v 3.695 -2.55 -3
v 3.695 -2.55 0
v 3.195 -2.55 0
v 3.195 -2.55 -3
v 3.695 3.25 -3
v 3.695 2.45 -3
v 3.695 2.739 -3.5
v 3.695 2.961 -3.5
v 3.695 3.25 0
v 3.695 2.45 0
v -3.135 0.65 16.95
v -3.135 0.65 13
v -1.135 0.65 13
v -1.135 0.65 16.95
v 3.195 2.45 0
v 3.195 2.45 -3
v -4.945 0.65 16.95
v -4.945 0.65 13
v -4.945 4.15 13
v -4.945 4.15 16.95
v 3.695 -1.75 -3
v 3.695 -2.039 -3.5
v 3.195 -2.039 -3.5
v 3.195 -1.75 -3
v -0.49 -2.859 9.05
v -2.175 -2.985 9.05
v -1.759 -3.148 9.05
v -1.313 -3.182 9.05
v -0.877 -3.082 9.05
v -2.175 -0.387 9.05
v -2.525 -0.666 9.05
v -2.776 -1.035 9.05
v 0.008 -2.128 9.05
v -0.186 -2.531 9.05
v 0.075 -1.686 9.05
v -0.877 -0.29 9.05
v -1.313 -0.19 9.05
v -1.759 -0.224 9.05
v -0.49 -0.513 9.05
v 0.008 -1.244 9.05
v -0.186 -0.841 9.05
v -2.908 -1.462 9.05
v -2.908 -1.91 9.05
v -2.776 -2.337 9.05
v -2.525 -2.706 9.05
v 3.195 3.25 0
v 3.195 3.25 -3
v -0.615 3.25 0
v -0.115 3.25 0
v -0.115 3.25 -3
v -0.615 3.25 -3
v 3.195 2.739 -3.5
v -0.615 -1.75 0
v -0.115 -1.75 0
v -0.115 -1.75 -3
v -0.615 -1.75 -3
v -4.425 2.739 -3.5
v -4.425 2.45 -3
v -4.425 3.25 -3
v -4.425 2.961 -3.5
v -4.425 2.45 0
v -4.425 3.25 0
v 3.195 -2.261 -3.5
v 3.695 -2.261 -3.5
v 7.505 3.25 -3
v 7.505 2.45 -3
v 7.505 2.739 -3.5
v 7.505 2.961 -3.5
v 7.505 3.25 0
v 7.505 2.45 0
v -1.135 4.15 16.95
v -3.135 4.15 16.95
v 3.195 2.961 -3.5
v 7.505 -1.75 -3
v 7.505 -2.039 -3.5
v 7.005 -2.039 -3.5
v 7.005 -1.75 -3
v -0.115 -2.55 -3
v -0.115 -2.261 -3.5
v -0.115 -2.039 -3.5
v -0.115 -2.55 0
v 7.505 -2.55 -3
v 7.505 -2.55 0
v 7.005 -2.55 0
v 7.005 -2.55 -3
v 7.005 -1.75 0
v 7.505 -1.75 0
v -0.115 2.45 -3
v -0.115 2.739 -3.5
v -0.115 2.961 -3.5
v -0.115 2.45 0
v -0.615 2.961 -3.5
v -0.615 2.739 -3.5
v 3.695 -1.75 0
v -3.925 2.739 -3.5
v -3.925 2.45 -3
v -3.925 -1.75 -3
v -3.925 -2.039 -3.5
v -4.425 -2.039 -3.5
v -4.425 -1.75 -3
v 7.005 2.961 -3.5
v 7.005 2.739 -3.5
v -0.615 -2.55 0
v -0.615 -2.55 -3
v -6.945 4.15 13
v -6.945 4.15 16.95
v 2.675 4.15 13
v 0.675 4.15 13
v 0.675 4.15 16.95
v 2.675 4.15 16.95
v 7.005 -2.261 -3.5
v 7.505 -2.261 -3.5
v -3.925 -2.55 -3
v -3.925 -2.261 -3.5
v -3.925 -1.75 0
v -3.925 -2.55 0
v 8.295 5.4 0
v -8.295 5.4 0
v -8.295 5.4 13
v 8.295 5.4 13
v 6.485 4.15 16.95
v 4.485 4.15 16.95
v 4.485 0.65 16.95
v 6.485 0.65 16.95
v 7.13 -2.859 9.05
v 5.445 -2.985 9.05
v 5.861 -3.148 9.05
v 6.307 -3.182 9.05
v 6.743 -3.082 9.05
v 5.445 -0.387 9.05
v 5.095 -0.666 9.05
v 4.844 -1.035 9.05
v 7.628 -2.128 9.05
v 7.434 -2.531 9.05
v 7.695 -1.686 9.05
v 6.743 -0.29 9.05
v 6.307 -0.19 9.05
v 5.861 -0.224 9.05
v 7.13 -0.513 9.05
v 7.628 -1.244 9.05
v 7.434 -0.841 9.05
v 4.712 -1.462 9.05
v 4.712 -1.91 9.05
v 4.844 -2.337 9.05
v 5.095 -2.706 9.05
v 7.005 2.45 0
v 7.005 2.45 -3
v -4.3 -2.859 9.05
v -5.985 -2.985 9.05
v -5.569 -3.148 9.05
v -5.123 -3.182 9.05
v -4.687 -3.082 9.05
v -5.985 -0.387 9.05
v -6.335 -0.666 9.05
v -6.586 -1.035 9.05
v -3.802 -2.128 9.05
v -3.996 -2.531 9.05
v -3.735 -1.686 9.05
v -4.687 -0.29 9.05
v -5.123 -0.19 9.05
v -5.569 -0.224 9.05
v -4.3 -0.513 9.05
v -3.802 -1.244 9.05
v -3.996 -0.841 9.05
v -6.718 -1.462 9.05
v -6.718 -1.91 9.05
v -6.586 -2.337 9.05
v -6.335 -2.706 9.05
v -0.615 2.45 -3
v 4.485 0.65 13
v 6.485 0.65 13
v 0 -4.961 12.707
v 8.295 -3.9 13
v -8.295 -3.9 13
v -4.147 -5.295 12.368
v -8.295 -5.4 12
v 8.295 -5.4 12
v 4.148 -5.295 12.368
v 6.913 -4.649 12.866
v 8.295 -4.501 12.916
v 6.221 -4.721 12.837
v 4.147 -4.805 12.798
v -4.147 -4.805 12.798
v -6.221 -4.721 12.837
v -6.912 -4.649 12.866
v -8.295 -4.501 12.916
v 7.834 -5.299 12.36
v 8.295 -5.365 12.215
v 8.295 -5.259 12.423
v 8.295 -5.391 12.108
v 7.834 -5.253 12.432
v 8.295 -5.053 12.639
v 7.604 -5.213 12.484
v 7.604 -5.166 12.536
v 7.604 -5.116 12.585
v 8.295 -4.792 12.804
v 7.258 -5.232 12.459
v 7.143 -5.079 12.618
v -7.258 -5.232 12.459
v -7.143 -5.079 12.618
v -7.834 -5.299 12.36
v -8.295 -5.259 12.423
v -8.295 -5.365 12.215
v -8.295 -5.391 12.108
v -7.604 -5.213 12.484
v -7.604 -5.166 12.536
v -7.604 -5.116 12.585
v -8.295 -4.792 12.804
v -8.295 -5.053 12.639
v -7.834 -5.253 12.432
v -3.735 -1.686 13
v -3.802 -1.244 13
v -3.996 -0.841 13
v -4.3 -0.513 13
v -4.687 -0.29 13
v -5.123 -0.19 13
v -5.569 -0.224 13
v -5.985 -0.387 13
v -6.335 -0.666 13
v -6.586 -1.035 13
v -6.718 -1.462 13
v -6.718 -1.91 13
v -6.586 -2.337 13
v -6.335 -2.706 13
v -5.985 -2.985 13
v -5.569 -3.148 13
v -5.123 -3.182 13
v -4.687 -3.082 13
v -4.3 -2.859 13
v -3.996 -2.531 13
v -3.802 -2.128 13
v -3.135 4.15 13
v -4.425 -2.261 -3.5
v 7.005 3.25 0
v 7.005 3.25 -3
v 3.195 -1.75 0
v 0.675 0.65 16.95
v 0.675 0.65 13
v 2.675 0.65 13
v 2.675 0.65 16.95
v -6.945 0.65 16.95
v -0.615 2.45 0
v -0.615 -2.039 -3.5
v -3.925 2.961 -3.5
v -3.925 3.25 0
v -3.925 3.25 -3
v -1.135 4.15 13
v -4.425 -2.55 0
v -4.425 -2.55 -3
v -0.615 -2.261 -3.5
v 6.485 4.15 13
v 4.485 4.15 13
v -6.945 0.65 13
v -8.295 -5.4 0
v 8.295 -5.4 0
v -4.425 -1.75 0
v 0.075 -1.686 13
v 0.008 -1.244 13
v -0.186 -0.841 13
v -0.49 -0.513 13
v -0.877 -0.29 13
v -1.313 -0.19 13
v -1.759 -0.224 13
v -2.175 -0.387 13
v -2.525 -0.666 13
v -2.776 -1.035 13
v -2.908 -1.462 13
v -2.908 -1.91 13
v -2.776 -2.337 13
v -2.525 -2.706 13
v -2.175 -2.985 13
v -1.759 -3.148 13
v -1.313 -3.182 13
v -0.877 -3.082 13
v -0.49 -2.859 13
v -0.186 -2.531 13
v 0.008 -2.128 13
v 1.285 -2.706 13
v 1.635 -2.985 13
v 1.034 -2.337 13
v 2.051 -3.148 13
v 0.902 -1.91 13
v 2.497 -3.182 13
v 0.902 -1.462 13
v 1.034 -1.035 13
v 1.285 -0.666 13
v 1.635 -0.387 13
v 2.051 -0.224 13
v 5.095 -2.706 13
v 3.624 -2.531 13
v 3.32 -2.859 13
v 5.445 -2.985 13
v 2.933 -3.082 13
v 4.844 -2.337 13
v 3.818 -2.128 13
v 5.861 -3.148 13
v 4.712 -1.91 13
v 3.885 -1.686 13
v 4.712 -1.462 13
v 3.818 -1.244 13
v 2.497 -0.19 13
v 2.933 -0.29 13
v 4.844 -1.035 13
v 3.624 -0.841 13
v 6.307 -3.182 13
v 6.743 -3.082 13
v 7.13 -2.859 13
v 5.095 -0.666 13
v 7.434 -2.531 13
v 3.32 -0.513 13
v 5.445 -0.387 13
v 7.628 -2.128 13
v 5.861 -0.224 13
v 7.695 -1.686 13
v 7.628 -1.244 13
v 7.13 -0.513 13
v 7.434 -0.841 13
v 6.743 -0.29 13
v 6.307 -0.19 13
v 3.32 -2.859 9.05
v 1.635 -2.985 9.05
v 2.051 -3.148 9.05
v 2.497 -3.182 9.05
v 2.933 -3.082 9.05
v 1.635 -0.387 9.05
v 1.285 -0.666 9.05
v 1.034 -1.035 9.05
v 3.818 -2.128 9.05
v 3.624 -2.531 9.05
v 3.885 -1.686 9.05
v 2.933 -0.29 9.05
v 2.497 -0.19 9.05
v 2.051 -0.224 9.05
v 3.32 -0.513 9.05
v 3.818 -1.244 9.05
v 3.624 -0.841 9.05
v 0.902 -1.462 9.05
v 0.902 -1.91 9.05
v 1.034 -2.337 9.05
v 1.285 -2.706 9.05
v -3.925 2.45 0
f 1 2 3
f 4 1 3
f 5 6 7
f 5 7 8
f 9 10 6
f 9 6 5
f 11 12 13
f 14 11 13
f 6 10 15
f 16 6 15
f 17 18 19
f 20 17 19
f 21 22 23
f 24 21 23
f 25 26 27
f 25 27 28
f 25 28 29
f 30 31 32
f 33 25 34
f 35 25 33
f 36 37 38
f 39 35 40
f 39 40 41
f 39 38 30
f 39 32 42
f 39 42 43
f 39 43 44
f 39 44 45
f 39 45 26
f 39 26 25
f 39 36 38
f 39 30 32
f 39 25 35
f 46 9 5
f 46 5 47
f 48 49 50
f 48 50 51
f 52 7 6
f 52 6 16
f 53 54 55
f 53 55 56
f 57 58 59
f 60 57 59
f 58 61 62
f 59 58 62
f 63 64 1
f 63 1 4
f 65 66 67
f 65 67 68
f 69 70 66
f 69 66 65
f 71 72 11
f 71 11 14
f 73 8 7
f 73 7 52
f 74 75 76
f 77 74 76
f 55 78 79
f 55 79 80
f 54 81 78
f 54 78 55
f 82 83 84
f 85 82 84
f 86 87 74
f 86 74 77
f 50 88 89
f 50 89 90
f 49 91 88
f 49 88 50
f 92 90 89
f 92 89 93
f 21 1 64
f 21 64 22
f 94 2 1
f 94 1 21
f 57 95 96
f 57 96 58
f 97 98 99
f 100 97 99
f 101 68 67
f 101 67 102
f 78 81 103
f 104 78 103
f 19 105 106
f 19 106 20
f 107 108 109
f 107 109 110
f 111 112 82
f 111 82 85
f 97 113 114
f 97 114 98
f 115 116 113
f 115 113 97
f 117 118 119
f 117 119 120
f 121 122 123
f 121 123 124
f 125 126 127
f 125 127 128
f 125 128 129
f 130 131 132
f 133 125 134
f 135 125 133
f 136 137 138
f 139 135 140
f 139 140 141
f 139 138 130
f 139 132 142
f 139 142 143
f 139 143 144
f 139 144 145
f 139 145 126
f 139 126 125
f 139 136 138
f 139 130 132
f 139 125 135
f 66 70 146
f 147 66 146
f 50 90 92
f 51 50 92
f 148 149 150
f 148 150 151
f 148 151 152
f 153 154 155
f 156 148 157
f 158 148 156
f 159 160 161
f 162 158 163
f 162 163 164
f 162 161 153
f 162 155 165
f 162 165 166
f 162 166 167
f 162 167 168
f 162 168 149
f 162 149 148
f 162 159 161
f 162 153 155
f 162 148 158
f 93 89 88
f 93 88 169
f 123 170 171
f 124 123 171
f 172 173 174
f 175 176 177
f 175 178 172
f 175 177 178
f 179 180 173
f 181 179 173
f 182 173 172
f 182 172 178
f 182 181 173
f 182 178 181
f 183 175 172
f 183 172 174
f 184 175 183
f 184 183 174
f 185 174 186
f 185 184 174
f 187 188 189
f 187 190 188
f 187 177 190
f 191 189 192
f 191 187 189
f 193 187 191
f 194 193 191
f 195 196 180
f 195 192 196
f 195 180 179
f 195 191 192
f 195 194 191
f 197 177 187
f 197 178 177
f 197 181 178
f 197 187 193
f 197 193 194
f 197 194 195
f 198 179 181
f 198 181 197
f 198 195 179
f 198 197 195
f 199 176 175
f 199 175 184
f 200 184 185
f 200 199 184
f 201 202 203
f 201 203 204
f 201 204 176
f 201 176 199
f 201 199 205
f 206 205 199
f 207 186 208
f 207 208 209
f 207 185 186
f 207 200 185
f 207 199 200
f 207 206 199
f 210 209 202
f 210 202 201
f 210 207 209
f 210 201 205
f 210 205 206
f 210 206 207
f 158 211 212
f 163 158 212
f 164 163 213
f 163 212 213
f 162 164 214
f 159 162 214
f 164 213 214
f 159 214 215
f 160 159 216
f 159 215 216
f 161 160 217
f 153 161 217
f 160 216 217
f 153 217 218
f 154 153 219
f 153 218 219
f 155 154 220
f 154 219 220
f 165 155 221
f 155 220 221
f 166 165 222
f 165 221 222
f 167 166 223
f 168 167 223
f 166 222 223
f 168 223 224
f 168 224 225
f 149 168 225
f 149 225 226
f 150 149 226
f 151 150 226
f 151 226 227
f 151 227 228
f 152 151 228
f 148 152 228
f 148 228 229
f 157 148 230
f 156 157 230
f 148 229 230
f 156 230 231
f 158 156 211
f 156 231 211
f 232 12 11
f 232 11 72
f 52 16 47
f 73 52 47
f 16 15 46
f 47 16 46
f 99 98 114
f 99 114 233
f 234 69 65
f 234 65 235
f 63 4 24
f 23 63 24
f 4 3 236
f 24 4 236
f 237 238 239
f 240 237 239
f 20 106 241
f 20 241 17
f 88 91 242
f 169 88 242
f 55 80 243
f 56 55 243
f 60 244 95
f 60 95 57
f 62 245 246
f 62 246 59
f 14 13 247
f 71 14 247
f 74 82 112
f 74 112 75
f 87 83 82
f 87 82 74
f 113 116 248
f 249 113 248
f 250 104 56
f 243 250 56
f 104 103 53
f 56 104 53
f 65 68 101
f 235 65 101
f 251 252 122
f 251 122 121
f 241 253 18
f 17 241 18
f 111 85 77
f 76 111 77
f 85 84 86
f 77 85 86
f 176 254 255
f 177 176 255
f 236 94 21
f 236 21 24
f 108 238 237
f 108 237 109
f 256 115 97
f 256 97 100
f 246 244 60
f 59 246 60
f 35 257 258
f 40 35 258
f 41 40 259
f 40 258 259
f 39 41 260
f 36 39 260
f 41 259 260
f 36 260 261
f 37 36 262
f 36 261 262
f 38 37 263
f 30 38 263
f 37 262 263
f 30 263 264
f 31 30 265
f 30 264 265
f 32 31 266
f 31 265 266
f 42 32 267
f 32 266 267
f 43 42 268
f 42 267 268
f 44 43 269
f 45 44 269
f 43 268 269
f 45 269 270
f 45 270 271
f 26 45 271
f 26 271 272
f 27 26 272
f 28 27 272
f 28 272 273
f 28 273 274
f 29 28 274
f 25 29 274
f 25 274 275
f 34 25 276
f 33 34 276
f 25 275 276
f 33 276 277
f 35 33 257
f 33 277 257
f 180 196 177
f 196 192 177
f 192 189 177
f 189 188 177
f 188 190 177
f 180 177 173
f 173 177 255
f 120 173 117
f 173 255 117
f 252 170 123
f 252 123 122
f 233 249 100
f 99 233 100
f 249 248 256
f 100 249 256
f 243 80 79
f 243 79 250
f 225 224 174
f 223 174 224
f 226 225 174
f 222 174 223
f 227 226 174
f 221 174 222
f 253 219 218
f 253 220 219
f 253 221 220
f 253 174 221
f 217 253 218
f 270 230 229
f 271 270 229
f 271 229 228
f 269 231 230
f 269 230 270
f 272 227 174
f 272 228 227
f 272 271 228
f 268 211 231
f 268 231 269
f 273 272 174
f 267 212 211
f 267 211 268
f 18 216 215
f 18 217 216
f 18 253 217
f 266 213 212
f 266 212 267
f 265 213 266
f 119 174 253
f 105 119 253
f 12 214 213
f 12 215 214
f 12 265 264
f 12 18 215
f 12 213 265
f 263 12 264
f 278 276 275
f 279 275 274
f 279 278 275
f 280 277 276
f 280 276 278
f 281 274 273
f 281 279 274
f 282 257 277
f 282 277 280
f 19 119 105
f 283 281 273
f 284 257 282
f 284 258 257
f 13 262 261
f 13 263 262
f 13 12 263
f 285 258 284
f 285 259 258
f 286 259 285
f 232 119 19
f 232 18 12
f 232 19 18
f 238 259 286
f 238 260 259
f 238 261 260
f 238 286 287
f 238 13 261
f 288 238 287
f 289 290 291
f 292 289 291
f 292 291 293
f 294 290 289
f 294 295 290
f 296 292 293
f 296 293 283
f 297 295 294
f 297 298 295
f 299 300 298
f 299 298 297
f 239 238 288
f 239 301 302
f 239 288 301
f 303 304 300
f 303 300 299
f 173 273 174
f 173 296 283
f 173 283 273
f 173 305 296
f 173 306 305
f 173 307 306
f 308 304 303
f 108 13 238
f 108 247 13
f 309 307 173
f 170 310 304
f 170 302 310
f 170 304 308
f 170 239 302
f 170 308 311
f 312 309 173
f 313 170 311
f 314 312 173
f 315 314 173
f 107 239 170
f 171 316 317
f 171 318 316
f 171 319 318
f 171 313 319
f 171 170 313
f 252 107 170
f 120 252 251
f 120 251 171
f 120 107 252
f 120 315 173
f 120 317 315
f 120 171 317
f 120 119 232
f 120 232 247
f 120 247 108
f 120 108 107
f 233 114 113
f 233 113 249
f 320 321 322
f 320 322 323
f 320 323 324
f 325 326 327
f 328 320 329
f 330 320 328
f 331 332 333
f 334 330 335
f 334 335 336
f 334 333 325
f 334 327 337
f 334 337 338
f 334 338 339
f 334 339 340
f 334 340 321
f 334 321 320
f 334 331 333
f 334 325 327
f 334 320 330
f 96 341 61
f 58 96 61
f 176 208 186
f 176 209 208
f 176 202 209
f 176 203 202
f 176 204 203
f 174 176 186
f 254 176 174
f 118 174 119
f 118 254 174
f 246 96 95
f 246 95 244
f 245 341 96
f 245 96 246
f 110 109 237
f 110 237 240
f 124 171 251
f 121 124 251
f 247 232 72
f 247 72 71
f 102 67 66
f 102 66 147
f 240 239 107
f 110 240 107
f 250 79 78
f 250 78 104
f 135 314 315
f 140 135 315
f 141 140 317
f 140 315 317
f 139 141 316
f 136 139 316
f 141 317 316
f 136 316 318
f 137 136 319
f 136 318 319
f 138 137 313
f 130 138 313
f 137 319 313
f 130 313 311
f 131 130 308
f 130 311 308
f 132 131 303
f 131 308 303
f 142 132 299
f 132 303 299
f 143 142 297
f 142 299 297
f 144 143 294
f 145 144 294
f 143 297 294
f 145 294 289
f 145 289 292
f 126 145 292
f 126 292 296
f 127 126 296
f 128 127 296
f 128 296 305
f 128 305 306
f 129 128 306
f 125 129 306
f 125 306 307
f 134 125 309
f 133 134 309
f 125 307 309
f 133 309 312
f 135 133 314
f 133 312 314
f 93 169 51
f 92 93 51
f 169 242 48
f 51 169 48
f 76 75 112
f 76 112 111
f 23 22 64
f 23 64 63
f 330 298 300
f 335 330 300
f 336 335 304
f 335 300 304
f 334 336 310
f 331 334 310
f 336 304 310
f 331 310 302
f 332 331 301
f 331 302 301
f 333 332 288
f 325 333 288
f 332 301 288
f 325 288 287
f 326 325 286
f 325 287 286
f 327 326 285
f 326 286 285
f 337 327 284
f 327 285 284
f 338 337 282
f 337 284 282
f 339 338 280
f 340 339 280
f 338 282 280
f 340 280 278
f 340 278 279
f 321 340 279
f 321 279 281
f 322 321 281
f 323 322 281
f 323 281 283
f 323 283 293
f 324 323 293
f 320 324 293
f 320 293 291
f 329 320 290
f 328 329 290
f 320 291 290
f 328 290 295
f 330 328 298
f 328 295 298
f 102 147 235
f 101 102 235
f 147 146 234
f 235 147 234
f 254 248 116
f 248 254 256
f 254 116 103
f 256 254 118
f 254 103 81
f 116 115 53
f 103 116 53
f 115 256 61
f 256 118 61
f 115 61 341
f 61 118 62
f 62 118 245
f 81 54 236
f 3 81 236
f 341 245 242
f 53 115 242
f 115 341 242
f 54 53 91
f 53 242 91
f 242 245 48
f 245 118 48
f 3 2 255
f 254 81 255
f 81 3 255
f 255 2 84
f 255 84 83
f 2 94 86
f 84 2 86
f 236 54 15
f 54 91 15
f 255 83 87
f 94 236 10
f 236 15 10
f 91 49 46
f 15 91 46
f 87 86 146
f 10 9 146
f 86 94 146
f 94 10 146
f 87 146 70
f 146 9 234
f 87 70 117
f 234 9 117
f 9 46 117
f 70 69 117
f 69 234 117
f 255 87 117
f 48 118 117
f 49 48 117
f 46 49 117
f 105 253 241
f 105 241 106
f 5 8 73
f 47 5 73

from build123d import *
from OCP.BRepFilletAPI import BRepFilletAPI_MakeChamfer

# Parameters (mm, degrees)
SKETCH_1_W                          = 16.59
SKETCH_1_H                          = 10.8
EXTRUDE_1_DEPTH                     = 13
FILLET_1_SIZE                       = 1
FILLET_1_SIZE_2                     = 1.5
SKETCH_2_W                          = 2
SKETCH_2_H                          = 3.5
EXTRUDE_2_DEPTH                     = 3.95
SKETCH_3_R                          = 1.5
CUT_EXTRUDE_1_DEPTH                 = 3.95
SKETCH_4_W                          = 0.5
SKETCH_4_H                          = 0.8
EXTRUDE_3_DEPTH                     = 3.5
CHAMFER_1_SIZE                      = 0.5
CHAMFER_1_SIZE2                     = 0.288675135
PATTERN_LINEAR_2_COUNT              = 4
PATTERN_LINEAR_2_PITCH              = 3.81
CHAMFER_1_OF_PATTERN_LINEAR_2_SIZE  = 0.5
CHAMFER_1_OF_PATTERN_LINEAR_2_SIZE2 = 0.288675135


with BuildPart() as part:
    # Эскиз1 → Бобышка-Вытянуть1 (new body)
    with BuildSketch(Plane.XY):
        Rectangle(SKETCH_1_W, SKETCH_1_H)
    extrude(amount=EXTRUDE_1_DEPTH)

    # Скругление1
    # an asymmetric fillet: 1.5, 1 mm, written as the material it takes off along each edge
    with BuildSketch(Plane(origin=(-12.045, -5.4, 13), x_dir=(0, 0, -1), z_dir=(1, 0, 0))) as fillet_1_piece_1:
        with BuildLine():
            Bezier((FILLET_1_SIZE, 0), (0, 0), (0, FILLET_1_SIZE_2), weights=[1, 0.707106781, 1])
            Line((0, FILLET_1_SIZE_2), (0, 0))
            Line((0, 0), (FILLET_1_SIZE, 0))
        make_face()
    extrude(amount=24.09, mode=Mode.SUBTRACT)

    # Эскиз2 → Бобышка-Вытянуть2 (add)
    with BuildSketch(Plane.XY.offset(13)):
        with Locations((5.485, 2.4)):
            Rectangle(SKETCH_2_W, SKETCH_2_H)
    extrude_2 = extrude(amount=EXTRUDE_2_DEPTH)

    # Эскиз3 → Вырез-Вытянуть1 (cut)
    with BuildSketch(Plane.XY.offset(13)):
        with Locations((6.195, -1.686021073)):
            Circle(SKETCH_3_R)
    cut_extrude_1 = extrude(amount=-CUT_EXTRUDE_1_DEPTH, mode=Mode.SUBTRACT)

    # Эскиз4 → Бобышка-Вытянуть3 (add)
    with BuildSketch(Plane(origin=(0, 0, 0), x_dir=(-1, 0, 0), z_dir=(0, 0, -1))):
        with Locations((-7.255, 2.85)):
            Rectangle(SKETCH_4_W, SKETCH_4_H)
        with Locations((-7.255, -2.15)):
            Rectangle(SKETCH_4_W, SKETCH_4_H)
    extrude_3 = extrude(amount=EXTRUDE_3_DEPTH)

    # Фаска1: one chamfer whose edges measure the first distance from different faces: ONE call of the kernel's chamfer builder (chamfer() names one face for all edges)
    chamfer_1_edges_1 = [part.edges().sort_by_distance(p)[0] for p in [
        (7.255, 3.25, -3.5),
    ]]
    chamfer_1_side_1 = [part.faces().sort_by_distance(p)[0] for p in [
        (7.255, 3.25, -1.75),
    ]]
    chamfer_1_edges_2 = [part.edges().sort_by_distance(p)[0] for p in [
        (7.255, 2.45, -3.5),
    ]]
    chamfer_1_side_2 = [part.faces().sort_by_distance(p)[0] for p in [
        (7.255, 2.45, -1.75),
    ]]
    chamfer_1_edges_3 = [part.edges().sort_by_distance(p)[0] for p in [
        (7.255, -2.55, -3.5),
    ]]
    chamfer_1_side_3 = [part.faces().sort_by_distance(p)[0] for p in [
        (7.255, -2.55, -1.75),
    ]]
    chamfer_1_edges_4 = [part.edges().sort_by_distance(p)[0] for p in [
        (7.255, -1.75, -3.5),
    ]]
    chamfer_1_side_4 = [part.faces().sort_by_distance(p)[0] for p in [
        (7.255, -1.75, -1.75),
    ]]
    chamfer_1 = BRepFilletAPI_MakeChamfer(part.part.solid().wrapped)
    for e in chamfer_1_edges_1:
        chamfer_1.Add(CHAMFER_1_SIZE, CHAMFER_1_SIZE2, e.wrapped, chamfer_1_side_1[0].wrapped)  # the first distance lies on this face
    for e in chamfer_1_edges_2:
        chamfer_1.Add(CHAMFER_1_SIZE, CHAMFER_1_SIZE2, e.wrapped, chamfer_1_side_2[0].wrapped)  # the first distance lies on this face
    for e in chamfer_1_edges_3:
        chamfer_1.Add(CHAMFER_1_SIZE, CHAMFER_1_SIZE2, e.wrapped, chamfer_1_side_3[0].wrapped)  # the first distance lies on this face
    for e in chamfer_1_edges_4:
        chamfer_1.Add(CHAMFER_1_SIZE, CHAMFER_1_SIZE2, e.wrapped, chamfer_1_side_4[0].wrapped)  # the first distance lies on this face
    add(Compound.cast(chamfer_1.Shape()), mode=Mode.REPLACE)

    # Линейный массив2: Бобышка-Вытянуть2, Вырез-Вытянуть1, Бобышка-Вытянуть3 ×4
    with Locations(*[(-i * PATTERN_LINEAR_2_PITCH, 0, 0) for i in range(1, PATTERN_LINEAR_2_COUNT)]):
        add(extrude_2)
        add(cut_extrude_1, mode=Mode.SUBTRACT)
        add(extrude_3)

    # Фаска1 of Линейный массив2: one chamfer whose edges measure the first distance from different faces: ONE call of the kernel's chamfer builder (chamfer() names one face for all edges)
    chamfer_1_of_pattern_linear_2_edges_1 = [part.edges().sort_by_distance(p)[0] for p in [
        (3.445, 3.25, -3.5),
    ]]
    chamfer_1_of_pattern_linear_2_side_1 = [part.faces().sort_by_distance(p)[0] for p in [
        (3.445, 3.25, -1.75),
    ]]
    chamfer_1_of_pattern_linear_2_edges_2 = [part.edges().sort_by_distance(p)[0] for p in [
        (3.445, 2.45, -3.5),
    ]]
    chamfer_1_of_pattern_linear_2_side_2 = [part.faces().sort_by_distance(p)[0] for p in [
        (3.445, 2.45, -1.75),
    ]]
    chamfer_1_of_pattern_linear_2_edges_3 = [part.edges().sort_by_distance(p)[0] for p in [
        (3.445, -2.55, -3.5),
    ]]
    chamfer_1_of_pattern_linear_2_side_3 = [part.faces().sort_by_distance(p)[0] for p in [
        (3.445, -2.55, -1.75),
    ]]
    chamfer_1_of_pattern_linear_2_edges_4 = [part.edges().sort_by_distance(p)[0] for p in [
        (3.445, -1.75, -3.5),
    ]]
    chamfer_1_of_pattern_linear_2_side_4 = [part.faces().sort_by_distance(p)[0] for p in [
        (3.445, -1.75, -1.75),
    ]]
    chamfer_1_of_pattern_linear_2_edges_5 = [part.edges().sort_by_distance(p)[0] for p in [
        (-0.365, 3.25, -3.5),
    ]]
    chamfer_1_of_pattern_linear_2_side_5 = [part.faces().sort_by_distance(p)[0] for p in [
        (-0.365, 3.25, -1.75),
    ]]
    chamfer_1_of_pattern_linear_2_edges_6 = [part.edges().sort_by_distance(p)[0] for p in [
        (-0.365, 2.45, -3.5),
    ]]
    chamfer_1_of_pattern_linear_2_side_6 = [part.faces().sort_by_distance(p)[0] for p in [
        (-0.365, 2.45, -1.75),
    ]]
    chamfer_1_of_pattern_linear_2_edges_7 = [part.edges().sort_by_distance(p)[0] for p in [
        (-0.365, -2.55, -3.5),
    ]]
    chamfer_1_of_pattern_linear_2_side_7 = [part.faces().sort_by_distance(p)[0] for p in [
        (-0.365, -2.55, -1.75),
    ]]
    chamfer_1_of_pattern_linear_2_edges_8 = [part.edges().sort_by_distance(p)[0] for p in [
        (-0.365, -1.75, -3.5),
    ]]
    chamfer_1_of_pattern_linear_2_side_8 = [part.faces().sort_by_distance(p)[0] for p in [
        (-0.365, -1.75, -1.75),
    ]]
    chamfer_1_of_pattern_linear_2_edges_9 = [part.edges().sort_by_distance(p)[0] for p in [
        (-4.175, 3.25, -3.5),
    ]]
    chamfer_1_of_pattern_linear_2_side_9 = [part.faces().sort_by_distance(p)[0] for p in [
        (-4.175, 3.25, -1.75),
    ]]
    chamfer_1_of_pattern_linear_2_edges_10 = [part.edges().sort_by_distance(p)[0] for p in [
        (-4.175, 2.45, -3.5),
    ]]
    chamfer_1_of_pattern_linear_2_side_10 = [part.faces().sort_by_distance(p)[0] for p in [
        (-4.175, 2.45, -1.75),
    ]]
    chamfer_1_of_pattern_linear_2_edges_11 = [part.edges().sort_by_distance(p)[0] for p in [
        (-4.175, -2.55, -3.5),
    ]]
    chamfer_1_of_pattern_linear_2_side_11 = [part.faces().sort_by_distance(p)[0] for p in [
        (-4.175, -2.55, -1.75),
    ]]
    chamfer_1_of_pattern_linear_2_edges_12 = [part.edges().sort_by_distance(p)[0] for p in [
        (-4.175, -1.75, -3.5),
    ]]
    chamfer_1_of_pattern_linear_2_side_12 = [part.faces().sort_by_distance(p)[0] for p in [
        (-4.175, -1.75, -1.75),
    ]]
    chamfer_1_of_pattern_linear_2 = BRepFilletAPI_MakeChamfer(part.part.solid().wrapped)
    for e in chamfer_1_of_pattern_linear_2_edges_1:
        chamfer_1_of_pattern_linear_2.Add(CHAMFER_1_OF_PATTERN_LINEAR_2_SIZE, CHAMFER_1_OF_PATTERN_LINEAR_2_SIZE2, e.wrapped, chamfer_1_of_pattern_linear_2_side_1[0].wrapped)  # the first distance lies on this face
    for e in chamfer_1_of_pattern_linear_2_edges_2:
        chamfer_1_of_pattern_linear_2.Add(CHAMFER_1_OF_PATTERN_LINEAR_2_SIZE, CHAMFER_1_OF_PATTERN_LINEAR_2_SIZE2, e.wrapped, chamfer_1_of_pattern_linear_2_side_2[0].wrapped)  # the first distance lies on this face
    for e in chamfer_1_of_pattern_linear_2_edges_3:
        chamfer_1_of_pattern_linear_2.Add(CHAMFER_1_OF_PATTERN_LINEAR_2_SIZE, CHAMFER_1_OF_PATTERN_LINEAR_2_SIZE2, e.wrapped, chamfer_1_of_pattern_linear_2_side_3[0].wrapped)  # the first distance lies on this face
    for e in chamfer_1_of_pattern_linear_2_edges_4:
        chamfer_1_of_pattern_linear_2.Add(CHAMFER_1_OF_PATTERN_LINEAR_2_SIZE, CHAMFER_1_OF_PATTERN_LINEAR_2_SIZE2, e.wrapped, chamfer_1_of_pattern_linear_2_side_4[0].wrapped)  # the first distance lies on this face
    for e in chamfer_1_of_pattern_linear_2_edges_5:
        chamfer_1_of_pattern_linear_2.Add(CHAMFER_1_OF_PATTERN_LINEAR_2_SIZE, CHAMFER_1_OF_PATTERN_LINEAR_2_SIZE2, e.wrapped, chamfer_1_of_pattern_linear_2_side_5[0].wrapped)  # the first distance lies on this face
    for e in chamfer_1_of_pattern_linear_2_edges_6:
        chamfer_1_of_pattern_linear_2.Add(CHAMFER_1_OF_PATTERN_LINEAR_2_SIZE, CHAMFER_1_OF_PATTERN_LINEAR_2_SIZE2, e.wrapped, chamfer_1_of_pattern_linear_2_side_6[0].wrapped)  # the first distance lies on this face
    for e in chamfer_1_of_pattern_linear_2_edges_7:
        chamfer_1_of_pattern_linear_2.Add(CHAMFER_1_OF_PATTERN_LINEAR_2_SIZE, CHAMFER_1_OF_PATTERN_LINEAR_2_SIZE2, e.wrapped, chamfer_1_of_pattern_linear_2_side_7[0].wrapped)  # the first distance lies on this face
    for e in chamfer_1_of_pattern_linear_2_edges_8:
        chamfer_1_of_pattern_linear_2.Add(CHAMFER_1_OF_PATTERN_LINEAR_2_SIZE, CHAMFER_1_OF_PATTERN_LINEAR_2_SIZE2, e.wrapped, chamfer_1_of_pattern_linear_2_side_8[0].wrapped)  # the first distance lies on this face
    for e in chamfer_1_of_pattern_linear_2_edges_9:
        chamfer_1_of_pattern_linear_2.Add(CHAMFER_1_OF_PATTERN_LINEAR_2_SIZE, CHAMFER_1_OF_PATTERN_LINEAR_2_SIZE2, e.wrapped, chamfer_1_of_pattern_linear_2_side_9[0].wrapped)  # the first distance lies on this face
    for e in chamfer_1_of_pattern_linear_2_edges_10:
        chamfer_1_of_pattern_linear_2.Add(CHAMFER_1_OF_PATTERN_LINEAR_2_SIZE, CHAMFER_1_OF_PATTERN_LINEAR_2_SIZE2, e.wrapped, chamfer_1_of_pattern_linear_2_side_10[0].wrapped)  # the first distance lies on this face
    for e in chamfer_1_of_pattern_linear_2_edges_11:
        chamfer_1_of_pattern_linear_2.Add(CHAMFER_1_OF_PATTERN_LINEAR_2_SIZE, CHAMFER_1_OF_PATTERN_LINEAR_2_SIZE2, e.wrapped, chamfer_1_of_pattern_linear_2_side_11[0].wrapped)  # the first distance lies on this face
    for e in chamfer_1_of_pattern_linear_2_edges_12:
        chamfer_1_of_pattern_linear_2.Add(CHAMFER_1_OF_PATTERN_LINEAR_2_SIZE, CHAMFER_1_OF_PATTERN_LINEAR_2_SIZE2, e.wrapped, chamfer_1_of_pattern_linear_2_side_12[0].wrapped)  # the first distance lies on this face
    add(Compound.cast(chamfer_1_of_pattern_linear_2.Shape()), mode=Mode.REPLACE)


solid = part.part
